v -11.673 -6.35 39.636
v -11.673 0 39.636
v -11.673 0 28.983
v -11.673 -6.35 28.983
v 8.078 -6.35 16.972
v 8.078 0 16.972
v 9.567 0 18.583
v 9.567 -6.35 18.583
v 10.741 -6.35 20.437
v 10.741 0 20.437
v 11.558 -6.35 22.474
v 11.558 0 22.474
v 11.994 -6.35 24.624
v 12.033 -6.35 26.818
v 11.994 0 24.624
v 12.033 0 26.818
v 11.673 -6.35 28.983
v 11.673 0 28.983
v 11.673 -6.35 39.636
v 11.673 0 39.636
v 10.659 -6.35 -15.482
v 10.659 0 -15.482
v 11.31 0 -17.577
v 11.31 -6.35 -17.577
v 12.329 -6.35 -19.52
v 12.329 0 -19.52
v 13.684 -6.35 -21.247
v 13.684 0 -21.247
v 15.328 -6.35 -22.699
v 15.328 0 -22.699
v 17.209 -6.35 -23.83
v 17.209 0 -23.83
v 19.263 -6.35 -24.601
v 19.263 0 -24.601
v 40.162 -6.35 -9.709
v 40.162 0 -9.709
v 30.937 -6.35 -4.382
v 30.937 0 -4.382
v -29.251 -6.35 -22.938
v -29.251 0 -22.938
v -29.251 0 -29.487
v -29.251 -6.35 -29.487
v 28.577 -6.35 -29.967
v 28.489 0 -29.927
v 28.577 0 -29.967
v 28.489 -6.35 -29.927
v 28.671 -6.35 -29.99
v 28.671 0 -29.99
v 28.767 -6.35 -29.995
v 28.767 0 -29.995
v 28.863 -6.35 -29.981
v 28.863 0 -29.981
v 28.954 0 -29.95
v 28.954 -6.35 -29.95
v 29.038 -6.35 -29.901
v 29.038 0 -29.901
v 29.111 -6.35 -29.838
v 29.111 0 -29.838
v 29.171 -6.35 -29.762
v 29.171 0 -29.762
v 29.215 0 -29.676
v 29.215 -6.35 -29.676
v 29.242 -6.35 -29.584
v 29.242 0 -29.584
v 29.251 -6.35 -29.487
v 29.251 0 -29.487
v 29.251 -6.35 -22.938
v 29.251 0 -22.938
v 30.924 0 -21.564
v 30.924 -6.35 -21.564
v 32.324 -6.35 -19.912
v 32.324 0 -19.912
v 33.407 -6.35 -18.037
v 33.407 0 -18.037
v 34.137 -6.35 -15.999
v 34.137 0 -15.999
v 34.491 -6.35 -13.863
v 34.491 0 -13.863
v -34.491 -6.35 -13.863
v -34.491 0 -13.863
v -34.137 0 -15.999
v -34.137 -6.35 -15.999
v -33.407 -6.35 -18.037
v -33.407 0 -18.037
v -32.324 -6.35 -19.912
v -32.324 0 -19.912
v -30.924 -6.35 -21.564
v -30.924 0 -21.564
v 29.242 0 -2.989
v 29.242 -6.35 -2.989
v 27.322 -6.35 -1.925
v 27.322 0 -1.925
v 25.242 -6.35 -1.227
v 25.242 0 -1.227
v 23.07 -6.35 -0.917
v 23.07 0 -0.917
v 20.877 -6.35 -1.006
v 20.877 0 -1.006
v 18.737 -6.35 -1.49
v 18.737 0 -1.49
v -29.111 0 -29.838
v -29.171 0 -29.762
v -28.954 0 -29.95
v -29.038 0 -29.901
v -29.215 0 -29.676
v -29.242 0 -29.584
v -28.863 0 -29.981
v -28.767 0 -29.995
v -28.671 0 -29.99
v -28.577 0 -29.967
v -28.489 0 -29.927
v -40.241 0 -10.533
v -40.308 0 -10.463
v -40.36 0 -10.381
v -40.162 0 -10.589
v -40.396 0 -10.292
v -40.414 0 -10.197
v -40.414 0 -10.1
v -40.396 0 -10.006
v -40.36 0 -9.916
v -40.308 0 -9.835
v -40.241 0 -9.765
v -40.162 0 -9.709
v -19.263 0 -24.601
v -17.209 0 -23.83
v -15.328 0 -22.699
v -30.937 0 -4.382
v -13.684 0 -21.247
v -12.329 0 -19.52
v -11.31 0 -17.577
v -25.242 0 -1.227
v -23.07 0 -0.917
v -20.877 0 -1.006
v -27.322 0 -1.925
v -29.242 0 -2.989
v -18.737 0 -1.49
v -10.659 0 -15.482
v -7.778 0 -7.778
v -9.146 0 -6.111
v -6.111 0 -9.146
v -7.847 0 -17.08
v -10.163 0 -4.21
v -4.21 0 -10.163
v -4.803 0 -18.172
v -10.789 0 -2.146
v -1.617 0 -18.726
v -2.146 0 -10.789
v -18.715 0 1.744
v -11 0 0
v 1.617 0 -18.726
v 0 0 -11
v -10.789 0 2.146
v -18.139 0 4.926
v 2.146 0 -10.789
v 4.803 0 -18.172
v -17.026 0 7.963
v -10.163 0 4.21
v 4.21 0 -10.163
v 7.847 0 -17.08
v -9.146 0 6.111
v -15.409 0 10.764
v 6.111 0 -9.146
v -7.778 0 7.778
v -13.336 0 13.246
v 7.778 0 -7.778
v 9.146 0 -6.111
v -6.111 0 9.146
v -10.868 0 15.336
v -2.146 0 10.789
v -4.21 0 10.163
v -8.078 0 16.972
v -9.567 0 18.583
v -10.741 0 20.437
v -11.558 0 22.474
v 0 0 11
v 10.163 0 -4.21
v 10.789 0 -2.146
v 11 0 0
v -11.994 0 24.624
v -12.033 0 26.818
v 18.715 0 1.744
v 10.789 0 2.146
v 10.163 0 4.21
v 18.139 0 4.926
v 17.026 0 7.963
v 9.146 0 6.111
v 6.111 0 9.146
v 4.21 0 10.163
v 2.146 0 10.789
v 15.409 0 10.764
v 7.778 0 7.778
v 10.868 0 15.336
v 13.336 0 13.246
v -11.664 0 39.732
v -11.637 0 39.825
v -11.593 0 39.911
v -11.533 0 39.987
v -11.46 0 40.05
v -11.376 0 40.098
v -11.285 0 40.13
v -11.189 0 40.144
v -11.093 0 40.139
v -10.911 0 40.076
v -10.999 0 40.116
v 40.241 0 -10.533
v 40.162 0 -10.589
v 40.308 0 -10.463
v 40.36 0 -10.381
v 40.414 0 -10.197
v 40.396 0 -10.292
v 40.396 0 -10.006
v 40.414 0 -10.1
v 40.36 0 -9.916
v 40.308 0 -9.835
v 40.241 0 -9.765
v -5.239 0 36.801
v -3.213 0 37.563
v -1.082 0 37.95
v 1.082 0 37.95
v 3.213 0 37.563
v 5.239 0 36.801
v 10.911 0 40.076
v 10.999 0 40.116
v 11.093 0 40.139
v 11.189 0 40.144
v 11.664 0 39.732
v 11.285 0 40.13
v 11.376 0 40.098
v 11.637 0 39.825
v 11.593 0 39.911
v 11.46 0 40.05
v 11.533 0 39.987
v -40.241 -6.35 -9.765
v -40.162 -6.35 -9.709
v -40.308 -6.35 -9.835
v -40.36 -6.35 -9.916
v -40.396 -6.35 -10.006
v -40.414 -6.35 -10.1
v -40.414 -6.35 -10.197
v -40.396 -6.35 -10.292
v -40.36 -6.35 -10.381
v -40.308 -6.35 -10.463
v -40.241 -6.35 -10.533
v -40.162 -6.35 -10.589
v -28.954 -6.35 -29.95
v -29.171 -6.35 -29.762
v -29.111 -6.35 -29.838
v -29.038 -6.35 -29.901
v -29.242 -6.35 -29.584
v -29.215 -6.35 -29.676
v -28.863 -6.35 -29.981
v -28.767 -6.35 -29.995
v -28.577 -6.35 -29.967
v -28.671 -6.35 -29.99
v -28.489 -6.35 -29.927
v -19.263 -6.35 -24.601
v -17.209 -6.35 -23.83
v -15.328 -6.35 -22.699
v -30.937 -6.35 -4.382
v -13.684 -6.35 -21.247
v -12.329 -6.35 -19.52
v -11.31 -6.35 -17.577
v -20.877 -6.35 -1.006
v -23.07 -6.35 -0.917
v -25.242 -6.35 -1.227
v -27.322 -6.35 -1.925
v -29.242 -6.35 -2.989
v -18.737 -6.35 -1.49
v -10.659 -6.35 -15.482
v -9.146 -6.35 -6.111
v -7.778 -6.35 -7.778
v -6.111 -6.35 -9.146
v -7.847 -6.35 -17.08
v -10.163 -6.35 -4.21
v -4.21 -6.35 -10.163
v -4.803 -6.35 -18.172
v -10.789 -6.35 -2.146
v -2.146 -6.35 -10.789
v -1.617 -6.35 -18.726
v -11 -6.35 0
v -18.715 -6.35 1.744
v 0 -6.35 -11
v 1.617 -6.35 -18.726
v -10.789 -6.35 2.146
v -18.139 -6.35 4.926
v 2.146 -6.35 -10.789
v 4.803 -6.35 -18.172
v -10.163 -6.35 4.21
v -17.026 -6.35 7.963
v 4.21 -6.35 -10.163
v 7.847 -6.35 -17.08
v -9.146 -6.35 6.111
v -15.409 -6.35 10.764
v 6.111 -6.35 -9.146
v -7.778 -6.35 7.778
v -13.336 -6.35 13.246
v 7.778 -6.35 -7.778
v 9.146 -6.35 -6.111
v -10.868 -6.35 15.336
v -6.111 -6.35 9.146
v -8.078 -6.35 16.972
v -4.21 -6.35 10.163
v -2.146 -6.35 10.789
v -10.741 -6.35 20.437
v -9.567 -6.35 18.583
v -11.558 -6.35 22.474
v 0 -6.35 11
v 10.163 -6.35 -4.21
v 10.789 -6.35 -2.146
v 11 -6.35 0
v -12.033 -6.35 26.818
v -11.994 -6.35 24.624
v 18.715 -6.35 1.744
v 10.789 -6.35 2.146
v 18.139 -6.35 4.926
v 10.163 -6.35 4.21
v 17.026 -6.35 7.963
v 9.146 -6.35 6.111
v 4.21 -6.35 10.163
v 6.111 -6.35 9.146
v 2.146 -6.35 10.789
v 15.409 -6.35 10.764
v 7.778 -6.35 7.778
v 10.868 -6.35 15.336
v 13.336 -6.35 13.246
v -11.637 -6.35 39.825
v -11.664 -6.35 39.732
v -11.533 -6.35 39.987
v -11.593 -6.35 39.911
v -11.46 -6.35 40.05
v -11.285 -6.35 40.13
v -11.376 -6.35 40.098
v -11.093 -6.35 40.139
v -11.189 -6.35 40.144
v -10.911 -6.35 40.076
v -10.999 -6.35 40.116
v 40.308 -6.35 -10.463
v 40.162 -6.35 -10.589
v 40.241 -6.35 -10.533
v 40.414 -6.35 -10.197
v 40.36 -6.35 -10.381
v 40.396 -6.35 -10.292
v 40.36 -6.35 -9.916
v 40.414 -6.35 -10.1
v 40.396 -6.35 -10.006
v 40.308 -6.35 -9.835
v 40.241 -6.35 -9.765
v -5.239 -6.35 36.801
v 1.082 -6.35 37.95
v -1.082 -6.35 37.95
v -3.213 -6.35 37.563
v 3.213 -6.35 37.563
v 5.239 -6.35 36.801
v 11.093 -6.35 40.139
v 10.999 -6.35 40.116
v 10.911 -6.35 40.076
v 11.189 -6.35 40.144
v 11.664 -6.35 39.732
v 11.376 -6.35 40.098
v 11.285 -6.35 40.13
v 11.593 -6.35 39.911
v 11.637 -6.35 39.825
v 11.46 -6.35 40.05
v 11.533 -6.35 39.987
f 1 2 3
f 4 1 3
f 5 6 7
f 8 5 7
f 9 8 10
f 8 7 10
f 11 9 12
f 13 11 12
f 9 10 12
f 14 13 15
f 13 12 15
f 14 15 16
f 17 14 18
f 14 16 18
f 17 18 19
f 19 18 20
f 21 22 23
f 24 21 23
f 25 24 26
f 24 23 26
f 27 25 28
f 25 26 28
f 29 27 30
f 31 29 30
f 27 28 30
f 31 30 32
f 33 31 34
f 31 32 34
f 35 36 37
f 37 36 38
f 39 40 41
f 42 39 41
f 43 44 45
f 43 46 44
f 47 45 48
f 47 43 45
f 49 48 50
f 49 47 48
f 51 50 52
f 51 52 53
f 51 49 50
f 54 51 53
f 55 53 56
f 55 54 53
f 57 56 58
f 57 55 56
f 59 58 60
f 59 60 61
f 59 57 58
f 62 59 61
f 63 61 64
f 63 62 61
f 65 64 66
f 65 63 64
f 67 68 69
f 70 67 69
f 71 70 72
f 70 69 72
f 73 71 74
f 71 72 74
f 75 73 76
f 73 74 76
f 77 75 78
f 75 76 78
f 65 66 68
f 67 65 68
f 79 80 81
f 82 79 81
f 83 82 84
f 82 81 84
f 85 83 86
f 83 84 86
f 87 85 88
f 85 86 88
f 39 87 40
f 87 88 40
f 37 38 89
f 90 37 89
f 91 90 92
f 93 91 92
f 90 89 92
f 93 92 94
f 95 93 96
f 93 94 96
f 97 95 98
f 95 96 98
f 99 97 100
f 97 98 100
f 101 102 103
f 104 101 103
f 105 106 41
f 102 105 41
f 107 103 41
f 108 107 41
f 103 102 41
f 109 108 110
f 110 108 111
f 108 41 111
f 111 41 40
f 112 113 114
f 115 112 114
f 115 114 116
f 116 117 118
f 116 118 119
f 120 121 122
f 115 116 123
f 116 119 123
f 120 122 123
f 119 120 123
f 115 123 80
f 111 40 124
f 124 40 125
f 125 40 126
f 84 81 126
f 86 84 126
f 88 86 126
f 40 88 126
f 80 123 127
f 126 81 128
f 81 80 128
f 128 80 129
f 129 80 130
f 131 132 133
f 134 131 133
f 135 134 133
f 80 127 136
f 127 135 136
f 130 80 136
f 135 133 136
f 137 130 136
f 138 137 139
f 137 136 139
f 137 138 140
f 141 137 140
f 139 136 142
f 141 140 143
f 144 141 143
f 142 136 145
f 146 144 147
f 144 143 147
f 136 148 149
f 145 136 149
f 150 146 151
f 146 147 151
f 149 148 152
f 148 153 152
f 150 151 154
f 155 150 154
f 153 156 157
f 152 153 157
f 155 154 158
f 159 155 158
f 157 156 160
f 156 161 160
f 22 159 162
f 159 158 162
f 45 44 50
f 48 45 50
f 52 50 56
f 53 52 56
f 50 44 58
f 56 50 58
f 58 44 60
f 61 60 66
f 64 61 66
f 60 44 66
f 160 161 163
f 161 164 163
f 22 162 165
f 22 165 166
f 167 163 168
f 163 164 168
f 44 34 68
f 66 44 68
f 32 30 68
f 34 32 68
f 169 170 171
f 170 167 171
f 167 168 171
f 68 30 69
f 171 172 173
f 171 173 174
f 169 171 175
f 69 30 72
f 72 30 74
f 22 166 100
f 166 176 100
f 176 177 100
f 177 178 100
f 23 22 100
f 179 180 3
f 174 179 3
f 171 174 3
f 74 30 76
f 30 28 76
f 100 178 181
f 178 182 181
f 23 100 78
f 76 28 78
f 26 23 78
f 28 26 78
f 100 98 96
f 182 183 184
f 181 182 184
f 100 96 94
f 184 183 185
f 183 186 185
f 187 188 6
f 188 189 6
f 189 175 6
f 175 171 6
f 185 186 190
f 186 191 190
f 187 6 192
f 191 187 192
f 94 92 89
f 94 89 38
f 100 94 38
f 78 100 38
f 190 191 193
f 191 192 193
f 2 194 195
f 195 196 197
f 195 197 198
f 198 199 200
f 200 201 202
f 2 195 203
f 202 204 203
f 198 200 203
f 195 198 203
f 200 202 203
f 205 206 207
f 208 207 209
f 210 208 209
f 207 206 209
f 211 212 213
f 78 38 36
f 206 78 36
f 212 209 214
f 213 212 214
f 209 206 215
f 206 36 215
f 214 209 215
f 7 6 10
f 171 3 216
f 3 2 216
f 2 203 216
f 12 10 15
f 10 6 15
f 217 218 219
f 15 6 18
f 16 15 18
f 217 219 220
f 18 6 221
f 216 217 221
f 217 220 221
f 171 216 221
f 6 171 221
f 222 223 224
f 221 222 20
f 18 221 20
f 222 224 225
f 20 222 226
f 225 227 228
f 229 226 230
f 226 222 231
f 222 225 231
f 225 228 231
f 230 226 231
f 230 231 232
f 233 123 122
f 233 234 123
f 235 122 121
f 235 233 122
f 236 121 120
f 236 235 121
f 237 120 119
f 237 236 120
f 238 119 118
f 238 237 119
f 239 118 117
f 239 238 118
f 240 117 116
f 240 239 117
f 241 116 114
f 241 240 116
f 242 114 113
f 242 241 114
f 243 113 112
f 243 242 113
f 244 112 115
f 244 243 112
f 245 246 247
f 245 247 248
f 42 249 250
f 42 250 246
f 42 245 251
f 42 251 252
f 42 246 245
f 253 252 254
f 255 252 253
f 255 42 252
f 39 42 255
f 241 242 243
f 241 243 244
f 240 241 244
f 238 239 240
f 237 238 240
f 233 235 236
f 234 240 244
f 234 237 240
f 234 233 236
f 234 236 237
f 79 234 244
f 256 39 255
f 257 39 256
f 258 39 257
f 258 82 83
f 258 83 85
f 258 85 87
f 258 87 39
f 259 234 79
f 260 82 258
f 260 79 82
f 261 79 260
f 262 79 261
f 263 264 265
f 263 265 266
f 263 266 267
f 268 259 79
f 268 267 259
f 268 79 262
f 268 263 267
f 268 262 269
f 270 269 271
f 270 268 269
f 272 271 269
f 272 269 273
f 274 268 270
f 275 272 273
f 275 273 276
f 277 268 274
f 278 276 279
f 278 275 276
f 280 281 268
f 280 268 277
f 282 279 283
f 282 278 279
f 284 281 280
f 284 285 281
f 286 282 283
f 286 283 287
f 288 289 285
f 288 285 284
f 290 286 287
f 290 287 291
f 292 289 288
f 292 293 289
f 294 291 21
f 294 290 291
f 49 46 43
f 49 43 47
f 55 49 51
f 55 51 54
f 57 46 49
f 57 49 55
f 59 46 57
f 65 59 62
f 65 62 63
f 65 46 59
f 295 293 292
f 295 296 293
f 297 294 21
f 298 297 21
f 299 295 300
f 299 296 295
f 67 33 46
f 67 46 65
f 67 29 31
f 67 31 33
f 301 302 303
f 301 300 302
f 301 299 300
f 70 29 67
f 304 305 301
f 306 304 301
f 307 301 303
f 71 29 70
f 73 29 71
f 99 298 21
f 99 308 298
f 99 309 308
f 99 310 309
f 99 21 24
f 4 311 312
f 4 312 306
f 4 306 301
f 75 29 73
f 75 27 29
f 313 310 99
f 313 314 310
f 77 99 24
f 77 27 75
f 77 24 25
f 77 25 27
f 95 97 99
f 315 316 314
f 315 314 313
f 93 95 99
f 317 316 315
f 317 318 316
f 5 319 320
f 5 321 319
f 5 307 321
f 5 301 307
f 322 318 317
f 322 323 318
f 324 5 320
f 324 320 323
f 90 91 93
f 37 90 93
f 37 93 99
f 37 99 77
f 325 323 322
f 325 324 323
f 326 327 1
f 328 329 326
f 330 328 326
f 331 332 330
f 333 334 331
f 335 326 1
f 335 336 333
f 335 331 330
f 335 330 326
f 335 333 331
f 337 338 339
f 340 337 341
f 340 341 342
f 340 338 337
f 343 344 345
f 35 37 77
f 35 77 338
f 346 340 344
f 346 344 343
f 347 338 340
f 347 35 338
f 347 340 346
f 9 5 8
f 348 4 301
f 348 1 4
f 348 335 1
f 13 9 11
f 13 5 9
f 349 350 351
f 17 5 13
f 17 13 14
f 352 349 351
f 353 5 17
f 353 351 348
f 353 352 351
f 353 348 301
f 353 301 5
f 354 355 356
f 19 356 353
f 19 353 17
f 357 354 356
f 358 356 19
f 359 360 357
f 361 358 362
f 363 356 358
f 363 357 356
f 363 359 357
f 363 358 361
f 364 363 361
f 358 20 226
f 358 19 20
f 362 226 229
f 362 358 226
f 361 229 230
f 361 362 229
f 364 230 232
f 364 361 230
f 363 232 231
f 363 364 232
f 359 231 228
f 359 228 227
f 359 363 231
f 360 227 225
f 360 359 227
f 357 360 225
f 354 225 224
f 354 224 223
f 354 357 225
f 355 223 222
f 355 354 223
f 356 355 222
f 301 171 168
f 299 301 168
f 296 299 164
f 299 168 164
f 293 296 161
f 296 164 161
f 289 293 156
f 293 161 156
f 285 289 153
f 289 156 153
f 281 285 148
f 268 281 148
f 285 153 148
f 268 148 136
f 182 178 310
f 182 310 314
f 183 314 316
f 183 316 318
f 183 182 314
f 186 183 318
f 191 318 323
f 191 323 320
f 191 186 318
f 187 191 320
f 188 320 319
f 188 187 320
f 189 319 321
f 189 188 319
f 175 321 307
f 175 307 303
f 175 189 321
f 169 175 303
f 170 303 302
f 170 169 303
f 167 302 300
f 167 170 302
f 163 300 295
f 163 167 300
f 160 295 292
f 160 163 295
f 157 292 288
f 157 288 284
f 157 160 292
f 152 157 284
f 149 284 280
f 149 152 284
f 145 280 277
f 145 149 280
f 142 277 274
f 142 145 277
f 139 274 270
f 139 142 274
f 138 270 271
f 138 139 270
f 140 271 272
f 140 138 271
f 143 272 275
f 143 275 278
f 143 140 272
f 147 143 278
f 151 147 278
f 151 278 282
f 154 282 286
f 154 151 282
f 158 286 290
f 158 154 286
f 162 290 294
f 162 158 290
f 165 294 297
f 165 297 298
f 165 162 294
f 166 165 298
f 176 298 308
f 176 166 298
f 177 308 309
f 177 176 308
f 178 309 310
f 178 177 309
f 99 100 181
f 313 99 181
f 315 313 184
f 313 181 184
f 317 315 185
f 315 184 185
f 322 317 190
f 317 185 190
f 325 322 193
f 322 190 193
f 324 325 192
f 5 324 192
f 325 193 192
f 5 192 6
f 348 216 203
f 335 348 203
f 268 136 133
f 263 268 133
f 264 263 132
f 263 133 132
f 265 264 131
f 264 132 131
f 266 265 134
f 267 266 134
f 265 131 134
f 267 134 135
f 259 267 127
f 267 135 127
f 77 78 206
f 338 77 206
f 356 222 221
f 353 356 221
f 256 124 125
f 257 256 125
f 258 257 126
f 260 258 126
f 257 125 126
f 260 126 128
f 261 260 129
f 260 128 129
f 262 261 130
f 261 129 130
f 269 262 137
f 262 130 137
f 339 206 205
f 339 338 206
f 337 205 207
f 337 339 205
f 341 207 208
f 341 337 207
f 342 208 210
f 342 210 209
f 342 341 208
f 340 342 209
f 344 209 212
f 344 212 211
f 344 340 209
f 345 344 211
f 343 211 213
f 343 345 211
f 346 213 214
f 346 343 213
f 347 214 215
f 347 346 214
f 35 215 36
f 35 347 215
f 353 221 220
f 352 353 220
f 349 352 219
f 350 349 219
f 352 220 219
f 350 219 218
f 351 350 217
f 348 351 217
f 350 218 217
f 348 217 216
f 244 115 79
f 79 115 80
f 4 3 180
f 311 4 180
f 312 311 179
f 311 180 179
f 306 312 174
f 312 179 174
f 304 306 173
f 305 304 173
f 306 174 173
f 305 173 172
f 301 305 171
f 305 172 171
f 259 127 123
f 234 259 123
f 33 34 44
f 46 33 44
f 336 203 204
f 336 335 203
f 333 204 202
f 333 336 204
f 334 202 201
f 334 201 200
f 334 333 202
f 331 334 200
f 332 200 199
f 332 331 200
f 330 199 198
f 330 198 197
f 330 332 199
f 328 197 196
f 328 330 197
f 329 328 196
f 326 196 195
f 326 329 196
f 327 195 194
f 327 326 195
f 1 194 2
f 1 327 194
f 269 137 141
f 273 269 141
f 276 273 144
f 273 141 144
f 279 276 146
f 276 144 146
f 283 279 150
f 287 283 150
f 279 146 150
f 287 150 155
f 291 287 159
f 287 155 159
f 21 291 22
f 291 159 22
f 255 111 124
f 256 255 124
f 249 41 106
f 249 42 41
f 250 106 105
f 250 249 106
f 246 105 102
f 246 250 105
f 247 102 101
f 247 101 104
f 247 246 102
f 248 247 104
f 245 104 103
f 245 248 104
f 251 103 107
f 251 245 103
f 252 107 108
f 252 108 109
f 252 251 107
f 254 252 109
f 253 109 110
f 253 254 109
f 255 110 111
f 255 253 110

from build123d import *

# Parameters (mm, degrees)
F0_R     = 11
F1_DEPTH = 6.35
F2_R     = 0.508


with BuildPart() as f1:
    # F0 (on Front) → F1 (new body)
    with BuildSketch(Plane.XZ):
        with BuildLine():
            ThreePointArc((30.936552, -4.382146), (25.241854, -1.227006), (18.736838, -1.490146))
            ThreePointArc((18.736838, -1.490146), (16.277813, 9.398), (8.077915, 16.97165))
            ThreePointArc((8.077915, 16.97165), (11.558309, 22.47359), (11.673226, 28.982913))
            ThreePointArc((11.673226, 28.982913), (9.316126, 33.599741), (5.239277, 36.801355))
            ThreePointArc((5.239277, 36.801355), (0, 37.99832), (-5.239277, 36.801355))
            ThreePointArc((-5.239277, 36.801355), (-9.316126, 33.599741), (-11.673226, 28.982913))
            ThreePointArc((-11.673226, 28.982913), (-11.558309, 22.47359), (-8.077915, 16.97165))
            ThreePointArc((-8.077915, 16.97165), (-16.277813, 9.398), (-18.736838, -1.490146))
            ThreePointArc((-18.736838, -1.490146), (-25.241854, -1.227006), (-30.936552, -4.382146))
            ThreePointArc((-30.936552, -4.382146), (-33.756293, -8.731869), (-34.490547, -13.86333))
            ThreePointArc((-34.490547, -13.86333), (-32.90751, -18.99916), (-29.25127, -22.938025))
            ThreePointArc((-29.25127, -22.938025), (-24.440167, -24.867872), (-19.263326, -24.600767))
            ThreePointArc((-19.263326, -24.600767), (-13.683546, -21.246584), (-10.658923, -15.481504))
            ThreePointArc((-10.658923, -15.481504), (0, -18.796), (10.658923, -15.481504))
            ThreePointArc((10.658923, -15.481504), (13.683546, -21.246584), (19.263326, -24.600767))
            ThreePointArc((19.263326, -24.600767), (24.440167, -24.867872), (29.25127, -22.938025))
            ThreePointArc((29.25127, -22.938025), (32.90751, -18.99916), (34.490547, -13.86333))
            ThreePointArc((34.490547, -13.86333), (33.756293, -8.731869), (30.936552, -4.382146))
        make_face()
        Circle(F0_R, mode=Mode.SUBTRACT)
        with BuildLine():
            Line((40.924496, -10.148688), (30.936552, -4.382146))
            ThreePointArc((30.936552, -4.382146), (33.756293, -8.731869), (34.490547, -13.86333))
            Line((34.490547, -13.86333), (40.924496, -10.148688))
        make_face()
        with BuildLine():
            ThreePointArc((5.239277, 36.801355), (9.316126, 33.599741), (11.673226, 28.982913))
            Line((11.673226, 28.982913), (11.673226, 40.515997))
            Line((11.673226, 40.515997), (5.239277, 36.801355))
        make_face()
        with BuildLine():
            Line((29.25127, -30.367309), (29.25127, -22.938025))
            ThreePointArc((29.25127, -22.938025), (24.440167, -24.867872), (19.263326, -24.600767))
            Line((19.263326, -24.600767), (29.25127, -30.367309))
        make_face()
        with BuildLine():
            ThreePointArc((-11.673226, 28.982913), (-9.316126, 33.599741), (-5.239277, 36.801355))
            Line((-5.239277, 36.801355), (-11.673226, 40.515997))
            Line((-11.673226, 40.515997), (-11.673226, 28.982913))
        make_face()
        with BuildLine():
            Line((-29.25127, -30.367309), (-19.263326, -24.600767))
            ThreePointArc((-19.263326, -24.600767), (-24.440167, -24.867872), (-29.25127, -22.938025))
            Line((-29.25127, -22.938025), (-29.25127, -30.367309))
        make_face()
        with BuildLine():
            ThreePointArc((-34.490547, -13.86333), (-33.756293, -8.731869), (-30.936552, -4.382146))
            Line((-30.936552, -4.382146), (-40.924496, -10.148688))
            Line((-40.924496, -10.148688), (-34.490547, -13.86333))
        make_face()
    extrude(amount=F1_DEPTH)

    # F2
    f2_edges = [f1.edges().sort_by_distance(p)[0] for p in [
        (-11.673226, -3.175, 40.515997),
        (11.673226, -3.175, 40.515997),
        (40.924496, -3.175, -10.148688),
        (29.25127, -3.175, -30.367309),
        (-29.25127, -3.175, -30.367309),
        (-40.924496, -3.175, -10.148688),
    ]]
    fillet(f2_edges, radius=F2_R)


solid = f1.part
